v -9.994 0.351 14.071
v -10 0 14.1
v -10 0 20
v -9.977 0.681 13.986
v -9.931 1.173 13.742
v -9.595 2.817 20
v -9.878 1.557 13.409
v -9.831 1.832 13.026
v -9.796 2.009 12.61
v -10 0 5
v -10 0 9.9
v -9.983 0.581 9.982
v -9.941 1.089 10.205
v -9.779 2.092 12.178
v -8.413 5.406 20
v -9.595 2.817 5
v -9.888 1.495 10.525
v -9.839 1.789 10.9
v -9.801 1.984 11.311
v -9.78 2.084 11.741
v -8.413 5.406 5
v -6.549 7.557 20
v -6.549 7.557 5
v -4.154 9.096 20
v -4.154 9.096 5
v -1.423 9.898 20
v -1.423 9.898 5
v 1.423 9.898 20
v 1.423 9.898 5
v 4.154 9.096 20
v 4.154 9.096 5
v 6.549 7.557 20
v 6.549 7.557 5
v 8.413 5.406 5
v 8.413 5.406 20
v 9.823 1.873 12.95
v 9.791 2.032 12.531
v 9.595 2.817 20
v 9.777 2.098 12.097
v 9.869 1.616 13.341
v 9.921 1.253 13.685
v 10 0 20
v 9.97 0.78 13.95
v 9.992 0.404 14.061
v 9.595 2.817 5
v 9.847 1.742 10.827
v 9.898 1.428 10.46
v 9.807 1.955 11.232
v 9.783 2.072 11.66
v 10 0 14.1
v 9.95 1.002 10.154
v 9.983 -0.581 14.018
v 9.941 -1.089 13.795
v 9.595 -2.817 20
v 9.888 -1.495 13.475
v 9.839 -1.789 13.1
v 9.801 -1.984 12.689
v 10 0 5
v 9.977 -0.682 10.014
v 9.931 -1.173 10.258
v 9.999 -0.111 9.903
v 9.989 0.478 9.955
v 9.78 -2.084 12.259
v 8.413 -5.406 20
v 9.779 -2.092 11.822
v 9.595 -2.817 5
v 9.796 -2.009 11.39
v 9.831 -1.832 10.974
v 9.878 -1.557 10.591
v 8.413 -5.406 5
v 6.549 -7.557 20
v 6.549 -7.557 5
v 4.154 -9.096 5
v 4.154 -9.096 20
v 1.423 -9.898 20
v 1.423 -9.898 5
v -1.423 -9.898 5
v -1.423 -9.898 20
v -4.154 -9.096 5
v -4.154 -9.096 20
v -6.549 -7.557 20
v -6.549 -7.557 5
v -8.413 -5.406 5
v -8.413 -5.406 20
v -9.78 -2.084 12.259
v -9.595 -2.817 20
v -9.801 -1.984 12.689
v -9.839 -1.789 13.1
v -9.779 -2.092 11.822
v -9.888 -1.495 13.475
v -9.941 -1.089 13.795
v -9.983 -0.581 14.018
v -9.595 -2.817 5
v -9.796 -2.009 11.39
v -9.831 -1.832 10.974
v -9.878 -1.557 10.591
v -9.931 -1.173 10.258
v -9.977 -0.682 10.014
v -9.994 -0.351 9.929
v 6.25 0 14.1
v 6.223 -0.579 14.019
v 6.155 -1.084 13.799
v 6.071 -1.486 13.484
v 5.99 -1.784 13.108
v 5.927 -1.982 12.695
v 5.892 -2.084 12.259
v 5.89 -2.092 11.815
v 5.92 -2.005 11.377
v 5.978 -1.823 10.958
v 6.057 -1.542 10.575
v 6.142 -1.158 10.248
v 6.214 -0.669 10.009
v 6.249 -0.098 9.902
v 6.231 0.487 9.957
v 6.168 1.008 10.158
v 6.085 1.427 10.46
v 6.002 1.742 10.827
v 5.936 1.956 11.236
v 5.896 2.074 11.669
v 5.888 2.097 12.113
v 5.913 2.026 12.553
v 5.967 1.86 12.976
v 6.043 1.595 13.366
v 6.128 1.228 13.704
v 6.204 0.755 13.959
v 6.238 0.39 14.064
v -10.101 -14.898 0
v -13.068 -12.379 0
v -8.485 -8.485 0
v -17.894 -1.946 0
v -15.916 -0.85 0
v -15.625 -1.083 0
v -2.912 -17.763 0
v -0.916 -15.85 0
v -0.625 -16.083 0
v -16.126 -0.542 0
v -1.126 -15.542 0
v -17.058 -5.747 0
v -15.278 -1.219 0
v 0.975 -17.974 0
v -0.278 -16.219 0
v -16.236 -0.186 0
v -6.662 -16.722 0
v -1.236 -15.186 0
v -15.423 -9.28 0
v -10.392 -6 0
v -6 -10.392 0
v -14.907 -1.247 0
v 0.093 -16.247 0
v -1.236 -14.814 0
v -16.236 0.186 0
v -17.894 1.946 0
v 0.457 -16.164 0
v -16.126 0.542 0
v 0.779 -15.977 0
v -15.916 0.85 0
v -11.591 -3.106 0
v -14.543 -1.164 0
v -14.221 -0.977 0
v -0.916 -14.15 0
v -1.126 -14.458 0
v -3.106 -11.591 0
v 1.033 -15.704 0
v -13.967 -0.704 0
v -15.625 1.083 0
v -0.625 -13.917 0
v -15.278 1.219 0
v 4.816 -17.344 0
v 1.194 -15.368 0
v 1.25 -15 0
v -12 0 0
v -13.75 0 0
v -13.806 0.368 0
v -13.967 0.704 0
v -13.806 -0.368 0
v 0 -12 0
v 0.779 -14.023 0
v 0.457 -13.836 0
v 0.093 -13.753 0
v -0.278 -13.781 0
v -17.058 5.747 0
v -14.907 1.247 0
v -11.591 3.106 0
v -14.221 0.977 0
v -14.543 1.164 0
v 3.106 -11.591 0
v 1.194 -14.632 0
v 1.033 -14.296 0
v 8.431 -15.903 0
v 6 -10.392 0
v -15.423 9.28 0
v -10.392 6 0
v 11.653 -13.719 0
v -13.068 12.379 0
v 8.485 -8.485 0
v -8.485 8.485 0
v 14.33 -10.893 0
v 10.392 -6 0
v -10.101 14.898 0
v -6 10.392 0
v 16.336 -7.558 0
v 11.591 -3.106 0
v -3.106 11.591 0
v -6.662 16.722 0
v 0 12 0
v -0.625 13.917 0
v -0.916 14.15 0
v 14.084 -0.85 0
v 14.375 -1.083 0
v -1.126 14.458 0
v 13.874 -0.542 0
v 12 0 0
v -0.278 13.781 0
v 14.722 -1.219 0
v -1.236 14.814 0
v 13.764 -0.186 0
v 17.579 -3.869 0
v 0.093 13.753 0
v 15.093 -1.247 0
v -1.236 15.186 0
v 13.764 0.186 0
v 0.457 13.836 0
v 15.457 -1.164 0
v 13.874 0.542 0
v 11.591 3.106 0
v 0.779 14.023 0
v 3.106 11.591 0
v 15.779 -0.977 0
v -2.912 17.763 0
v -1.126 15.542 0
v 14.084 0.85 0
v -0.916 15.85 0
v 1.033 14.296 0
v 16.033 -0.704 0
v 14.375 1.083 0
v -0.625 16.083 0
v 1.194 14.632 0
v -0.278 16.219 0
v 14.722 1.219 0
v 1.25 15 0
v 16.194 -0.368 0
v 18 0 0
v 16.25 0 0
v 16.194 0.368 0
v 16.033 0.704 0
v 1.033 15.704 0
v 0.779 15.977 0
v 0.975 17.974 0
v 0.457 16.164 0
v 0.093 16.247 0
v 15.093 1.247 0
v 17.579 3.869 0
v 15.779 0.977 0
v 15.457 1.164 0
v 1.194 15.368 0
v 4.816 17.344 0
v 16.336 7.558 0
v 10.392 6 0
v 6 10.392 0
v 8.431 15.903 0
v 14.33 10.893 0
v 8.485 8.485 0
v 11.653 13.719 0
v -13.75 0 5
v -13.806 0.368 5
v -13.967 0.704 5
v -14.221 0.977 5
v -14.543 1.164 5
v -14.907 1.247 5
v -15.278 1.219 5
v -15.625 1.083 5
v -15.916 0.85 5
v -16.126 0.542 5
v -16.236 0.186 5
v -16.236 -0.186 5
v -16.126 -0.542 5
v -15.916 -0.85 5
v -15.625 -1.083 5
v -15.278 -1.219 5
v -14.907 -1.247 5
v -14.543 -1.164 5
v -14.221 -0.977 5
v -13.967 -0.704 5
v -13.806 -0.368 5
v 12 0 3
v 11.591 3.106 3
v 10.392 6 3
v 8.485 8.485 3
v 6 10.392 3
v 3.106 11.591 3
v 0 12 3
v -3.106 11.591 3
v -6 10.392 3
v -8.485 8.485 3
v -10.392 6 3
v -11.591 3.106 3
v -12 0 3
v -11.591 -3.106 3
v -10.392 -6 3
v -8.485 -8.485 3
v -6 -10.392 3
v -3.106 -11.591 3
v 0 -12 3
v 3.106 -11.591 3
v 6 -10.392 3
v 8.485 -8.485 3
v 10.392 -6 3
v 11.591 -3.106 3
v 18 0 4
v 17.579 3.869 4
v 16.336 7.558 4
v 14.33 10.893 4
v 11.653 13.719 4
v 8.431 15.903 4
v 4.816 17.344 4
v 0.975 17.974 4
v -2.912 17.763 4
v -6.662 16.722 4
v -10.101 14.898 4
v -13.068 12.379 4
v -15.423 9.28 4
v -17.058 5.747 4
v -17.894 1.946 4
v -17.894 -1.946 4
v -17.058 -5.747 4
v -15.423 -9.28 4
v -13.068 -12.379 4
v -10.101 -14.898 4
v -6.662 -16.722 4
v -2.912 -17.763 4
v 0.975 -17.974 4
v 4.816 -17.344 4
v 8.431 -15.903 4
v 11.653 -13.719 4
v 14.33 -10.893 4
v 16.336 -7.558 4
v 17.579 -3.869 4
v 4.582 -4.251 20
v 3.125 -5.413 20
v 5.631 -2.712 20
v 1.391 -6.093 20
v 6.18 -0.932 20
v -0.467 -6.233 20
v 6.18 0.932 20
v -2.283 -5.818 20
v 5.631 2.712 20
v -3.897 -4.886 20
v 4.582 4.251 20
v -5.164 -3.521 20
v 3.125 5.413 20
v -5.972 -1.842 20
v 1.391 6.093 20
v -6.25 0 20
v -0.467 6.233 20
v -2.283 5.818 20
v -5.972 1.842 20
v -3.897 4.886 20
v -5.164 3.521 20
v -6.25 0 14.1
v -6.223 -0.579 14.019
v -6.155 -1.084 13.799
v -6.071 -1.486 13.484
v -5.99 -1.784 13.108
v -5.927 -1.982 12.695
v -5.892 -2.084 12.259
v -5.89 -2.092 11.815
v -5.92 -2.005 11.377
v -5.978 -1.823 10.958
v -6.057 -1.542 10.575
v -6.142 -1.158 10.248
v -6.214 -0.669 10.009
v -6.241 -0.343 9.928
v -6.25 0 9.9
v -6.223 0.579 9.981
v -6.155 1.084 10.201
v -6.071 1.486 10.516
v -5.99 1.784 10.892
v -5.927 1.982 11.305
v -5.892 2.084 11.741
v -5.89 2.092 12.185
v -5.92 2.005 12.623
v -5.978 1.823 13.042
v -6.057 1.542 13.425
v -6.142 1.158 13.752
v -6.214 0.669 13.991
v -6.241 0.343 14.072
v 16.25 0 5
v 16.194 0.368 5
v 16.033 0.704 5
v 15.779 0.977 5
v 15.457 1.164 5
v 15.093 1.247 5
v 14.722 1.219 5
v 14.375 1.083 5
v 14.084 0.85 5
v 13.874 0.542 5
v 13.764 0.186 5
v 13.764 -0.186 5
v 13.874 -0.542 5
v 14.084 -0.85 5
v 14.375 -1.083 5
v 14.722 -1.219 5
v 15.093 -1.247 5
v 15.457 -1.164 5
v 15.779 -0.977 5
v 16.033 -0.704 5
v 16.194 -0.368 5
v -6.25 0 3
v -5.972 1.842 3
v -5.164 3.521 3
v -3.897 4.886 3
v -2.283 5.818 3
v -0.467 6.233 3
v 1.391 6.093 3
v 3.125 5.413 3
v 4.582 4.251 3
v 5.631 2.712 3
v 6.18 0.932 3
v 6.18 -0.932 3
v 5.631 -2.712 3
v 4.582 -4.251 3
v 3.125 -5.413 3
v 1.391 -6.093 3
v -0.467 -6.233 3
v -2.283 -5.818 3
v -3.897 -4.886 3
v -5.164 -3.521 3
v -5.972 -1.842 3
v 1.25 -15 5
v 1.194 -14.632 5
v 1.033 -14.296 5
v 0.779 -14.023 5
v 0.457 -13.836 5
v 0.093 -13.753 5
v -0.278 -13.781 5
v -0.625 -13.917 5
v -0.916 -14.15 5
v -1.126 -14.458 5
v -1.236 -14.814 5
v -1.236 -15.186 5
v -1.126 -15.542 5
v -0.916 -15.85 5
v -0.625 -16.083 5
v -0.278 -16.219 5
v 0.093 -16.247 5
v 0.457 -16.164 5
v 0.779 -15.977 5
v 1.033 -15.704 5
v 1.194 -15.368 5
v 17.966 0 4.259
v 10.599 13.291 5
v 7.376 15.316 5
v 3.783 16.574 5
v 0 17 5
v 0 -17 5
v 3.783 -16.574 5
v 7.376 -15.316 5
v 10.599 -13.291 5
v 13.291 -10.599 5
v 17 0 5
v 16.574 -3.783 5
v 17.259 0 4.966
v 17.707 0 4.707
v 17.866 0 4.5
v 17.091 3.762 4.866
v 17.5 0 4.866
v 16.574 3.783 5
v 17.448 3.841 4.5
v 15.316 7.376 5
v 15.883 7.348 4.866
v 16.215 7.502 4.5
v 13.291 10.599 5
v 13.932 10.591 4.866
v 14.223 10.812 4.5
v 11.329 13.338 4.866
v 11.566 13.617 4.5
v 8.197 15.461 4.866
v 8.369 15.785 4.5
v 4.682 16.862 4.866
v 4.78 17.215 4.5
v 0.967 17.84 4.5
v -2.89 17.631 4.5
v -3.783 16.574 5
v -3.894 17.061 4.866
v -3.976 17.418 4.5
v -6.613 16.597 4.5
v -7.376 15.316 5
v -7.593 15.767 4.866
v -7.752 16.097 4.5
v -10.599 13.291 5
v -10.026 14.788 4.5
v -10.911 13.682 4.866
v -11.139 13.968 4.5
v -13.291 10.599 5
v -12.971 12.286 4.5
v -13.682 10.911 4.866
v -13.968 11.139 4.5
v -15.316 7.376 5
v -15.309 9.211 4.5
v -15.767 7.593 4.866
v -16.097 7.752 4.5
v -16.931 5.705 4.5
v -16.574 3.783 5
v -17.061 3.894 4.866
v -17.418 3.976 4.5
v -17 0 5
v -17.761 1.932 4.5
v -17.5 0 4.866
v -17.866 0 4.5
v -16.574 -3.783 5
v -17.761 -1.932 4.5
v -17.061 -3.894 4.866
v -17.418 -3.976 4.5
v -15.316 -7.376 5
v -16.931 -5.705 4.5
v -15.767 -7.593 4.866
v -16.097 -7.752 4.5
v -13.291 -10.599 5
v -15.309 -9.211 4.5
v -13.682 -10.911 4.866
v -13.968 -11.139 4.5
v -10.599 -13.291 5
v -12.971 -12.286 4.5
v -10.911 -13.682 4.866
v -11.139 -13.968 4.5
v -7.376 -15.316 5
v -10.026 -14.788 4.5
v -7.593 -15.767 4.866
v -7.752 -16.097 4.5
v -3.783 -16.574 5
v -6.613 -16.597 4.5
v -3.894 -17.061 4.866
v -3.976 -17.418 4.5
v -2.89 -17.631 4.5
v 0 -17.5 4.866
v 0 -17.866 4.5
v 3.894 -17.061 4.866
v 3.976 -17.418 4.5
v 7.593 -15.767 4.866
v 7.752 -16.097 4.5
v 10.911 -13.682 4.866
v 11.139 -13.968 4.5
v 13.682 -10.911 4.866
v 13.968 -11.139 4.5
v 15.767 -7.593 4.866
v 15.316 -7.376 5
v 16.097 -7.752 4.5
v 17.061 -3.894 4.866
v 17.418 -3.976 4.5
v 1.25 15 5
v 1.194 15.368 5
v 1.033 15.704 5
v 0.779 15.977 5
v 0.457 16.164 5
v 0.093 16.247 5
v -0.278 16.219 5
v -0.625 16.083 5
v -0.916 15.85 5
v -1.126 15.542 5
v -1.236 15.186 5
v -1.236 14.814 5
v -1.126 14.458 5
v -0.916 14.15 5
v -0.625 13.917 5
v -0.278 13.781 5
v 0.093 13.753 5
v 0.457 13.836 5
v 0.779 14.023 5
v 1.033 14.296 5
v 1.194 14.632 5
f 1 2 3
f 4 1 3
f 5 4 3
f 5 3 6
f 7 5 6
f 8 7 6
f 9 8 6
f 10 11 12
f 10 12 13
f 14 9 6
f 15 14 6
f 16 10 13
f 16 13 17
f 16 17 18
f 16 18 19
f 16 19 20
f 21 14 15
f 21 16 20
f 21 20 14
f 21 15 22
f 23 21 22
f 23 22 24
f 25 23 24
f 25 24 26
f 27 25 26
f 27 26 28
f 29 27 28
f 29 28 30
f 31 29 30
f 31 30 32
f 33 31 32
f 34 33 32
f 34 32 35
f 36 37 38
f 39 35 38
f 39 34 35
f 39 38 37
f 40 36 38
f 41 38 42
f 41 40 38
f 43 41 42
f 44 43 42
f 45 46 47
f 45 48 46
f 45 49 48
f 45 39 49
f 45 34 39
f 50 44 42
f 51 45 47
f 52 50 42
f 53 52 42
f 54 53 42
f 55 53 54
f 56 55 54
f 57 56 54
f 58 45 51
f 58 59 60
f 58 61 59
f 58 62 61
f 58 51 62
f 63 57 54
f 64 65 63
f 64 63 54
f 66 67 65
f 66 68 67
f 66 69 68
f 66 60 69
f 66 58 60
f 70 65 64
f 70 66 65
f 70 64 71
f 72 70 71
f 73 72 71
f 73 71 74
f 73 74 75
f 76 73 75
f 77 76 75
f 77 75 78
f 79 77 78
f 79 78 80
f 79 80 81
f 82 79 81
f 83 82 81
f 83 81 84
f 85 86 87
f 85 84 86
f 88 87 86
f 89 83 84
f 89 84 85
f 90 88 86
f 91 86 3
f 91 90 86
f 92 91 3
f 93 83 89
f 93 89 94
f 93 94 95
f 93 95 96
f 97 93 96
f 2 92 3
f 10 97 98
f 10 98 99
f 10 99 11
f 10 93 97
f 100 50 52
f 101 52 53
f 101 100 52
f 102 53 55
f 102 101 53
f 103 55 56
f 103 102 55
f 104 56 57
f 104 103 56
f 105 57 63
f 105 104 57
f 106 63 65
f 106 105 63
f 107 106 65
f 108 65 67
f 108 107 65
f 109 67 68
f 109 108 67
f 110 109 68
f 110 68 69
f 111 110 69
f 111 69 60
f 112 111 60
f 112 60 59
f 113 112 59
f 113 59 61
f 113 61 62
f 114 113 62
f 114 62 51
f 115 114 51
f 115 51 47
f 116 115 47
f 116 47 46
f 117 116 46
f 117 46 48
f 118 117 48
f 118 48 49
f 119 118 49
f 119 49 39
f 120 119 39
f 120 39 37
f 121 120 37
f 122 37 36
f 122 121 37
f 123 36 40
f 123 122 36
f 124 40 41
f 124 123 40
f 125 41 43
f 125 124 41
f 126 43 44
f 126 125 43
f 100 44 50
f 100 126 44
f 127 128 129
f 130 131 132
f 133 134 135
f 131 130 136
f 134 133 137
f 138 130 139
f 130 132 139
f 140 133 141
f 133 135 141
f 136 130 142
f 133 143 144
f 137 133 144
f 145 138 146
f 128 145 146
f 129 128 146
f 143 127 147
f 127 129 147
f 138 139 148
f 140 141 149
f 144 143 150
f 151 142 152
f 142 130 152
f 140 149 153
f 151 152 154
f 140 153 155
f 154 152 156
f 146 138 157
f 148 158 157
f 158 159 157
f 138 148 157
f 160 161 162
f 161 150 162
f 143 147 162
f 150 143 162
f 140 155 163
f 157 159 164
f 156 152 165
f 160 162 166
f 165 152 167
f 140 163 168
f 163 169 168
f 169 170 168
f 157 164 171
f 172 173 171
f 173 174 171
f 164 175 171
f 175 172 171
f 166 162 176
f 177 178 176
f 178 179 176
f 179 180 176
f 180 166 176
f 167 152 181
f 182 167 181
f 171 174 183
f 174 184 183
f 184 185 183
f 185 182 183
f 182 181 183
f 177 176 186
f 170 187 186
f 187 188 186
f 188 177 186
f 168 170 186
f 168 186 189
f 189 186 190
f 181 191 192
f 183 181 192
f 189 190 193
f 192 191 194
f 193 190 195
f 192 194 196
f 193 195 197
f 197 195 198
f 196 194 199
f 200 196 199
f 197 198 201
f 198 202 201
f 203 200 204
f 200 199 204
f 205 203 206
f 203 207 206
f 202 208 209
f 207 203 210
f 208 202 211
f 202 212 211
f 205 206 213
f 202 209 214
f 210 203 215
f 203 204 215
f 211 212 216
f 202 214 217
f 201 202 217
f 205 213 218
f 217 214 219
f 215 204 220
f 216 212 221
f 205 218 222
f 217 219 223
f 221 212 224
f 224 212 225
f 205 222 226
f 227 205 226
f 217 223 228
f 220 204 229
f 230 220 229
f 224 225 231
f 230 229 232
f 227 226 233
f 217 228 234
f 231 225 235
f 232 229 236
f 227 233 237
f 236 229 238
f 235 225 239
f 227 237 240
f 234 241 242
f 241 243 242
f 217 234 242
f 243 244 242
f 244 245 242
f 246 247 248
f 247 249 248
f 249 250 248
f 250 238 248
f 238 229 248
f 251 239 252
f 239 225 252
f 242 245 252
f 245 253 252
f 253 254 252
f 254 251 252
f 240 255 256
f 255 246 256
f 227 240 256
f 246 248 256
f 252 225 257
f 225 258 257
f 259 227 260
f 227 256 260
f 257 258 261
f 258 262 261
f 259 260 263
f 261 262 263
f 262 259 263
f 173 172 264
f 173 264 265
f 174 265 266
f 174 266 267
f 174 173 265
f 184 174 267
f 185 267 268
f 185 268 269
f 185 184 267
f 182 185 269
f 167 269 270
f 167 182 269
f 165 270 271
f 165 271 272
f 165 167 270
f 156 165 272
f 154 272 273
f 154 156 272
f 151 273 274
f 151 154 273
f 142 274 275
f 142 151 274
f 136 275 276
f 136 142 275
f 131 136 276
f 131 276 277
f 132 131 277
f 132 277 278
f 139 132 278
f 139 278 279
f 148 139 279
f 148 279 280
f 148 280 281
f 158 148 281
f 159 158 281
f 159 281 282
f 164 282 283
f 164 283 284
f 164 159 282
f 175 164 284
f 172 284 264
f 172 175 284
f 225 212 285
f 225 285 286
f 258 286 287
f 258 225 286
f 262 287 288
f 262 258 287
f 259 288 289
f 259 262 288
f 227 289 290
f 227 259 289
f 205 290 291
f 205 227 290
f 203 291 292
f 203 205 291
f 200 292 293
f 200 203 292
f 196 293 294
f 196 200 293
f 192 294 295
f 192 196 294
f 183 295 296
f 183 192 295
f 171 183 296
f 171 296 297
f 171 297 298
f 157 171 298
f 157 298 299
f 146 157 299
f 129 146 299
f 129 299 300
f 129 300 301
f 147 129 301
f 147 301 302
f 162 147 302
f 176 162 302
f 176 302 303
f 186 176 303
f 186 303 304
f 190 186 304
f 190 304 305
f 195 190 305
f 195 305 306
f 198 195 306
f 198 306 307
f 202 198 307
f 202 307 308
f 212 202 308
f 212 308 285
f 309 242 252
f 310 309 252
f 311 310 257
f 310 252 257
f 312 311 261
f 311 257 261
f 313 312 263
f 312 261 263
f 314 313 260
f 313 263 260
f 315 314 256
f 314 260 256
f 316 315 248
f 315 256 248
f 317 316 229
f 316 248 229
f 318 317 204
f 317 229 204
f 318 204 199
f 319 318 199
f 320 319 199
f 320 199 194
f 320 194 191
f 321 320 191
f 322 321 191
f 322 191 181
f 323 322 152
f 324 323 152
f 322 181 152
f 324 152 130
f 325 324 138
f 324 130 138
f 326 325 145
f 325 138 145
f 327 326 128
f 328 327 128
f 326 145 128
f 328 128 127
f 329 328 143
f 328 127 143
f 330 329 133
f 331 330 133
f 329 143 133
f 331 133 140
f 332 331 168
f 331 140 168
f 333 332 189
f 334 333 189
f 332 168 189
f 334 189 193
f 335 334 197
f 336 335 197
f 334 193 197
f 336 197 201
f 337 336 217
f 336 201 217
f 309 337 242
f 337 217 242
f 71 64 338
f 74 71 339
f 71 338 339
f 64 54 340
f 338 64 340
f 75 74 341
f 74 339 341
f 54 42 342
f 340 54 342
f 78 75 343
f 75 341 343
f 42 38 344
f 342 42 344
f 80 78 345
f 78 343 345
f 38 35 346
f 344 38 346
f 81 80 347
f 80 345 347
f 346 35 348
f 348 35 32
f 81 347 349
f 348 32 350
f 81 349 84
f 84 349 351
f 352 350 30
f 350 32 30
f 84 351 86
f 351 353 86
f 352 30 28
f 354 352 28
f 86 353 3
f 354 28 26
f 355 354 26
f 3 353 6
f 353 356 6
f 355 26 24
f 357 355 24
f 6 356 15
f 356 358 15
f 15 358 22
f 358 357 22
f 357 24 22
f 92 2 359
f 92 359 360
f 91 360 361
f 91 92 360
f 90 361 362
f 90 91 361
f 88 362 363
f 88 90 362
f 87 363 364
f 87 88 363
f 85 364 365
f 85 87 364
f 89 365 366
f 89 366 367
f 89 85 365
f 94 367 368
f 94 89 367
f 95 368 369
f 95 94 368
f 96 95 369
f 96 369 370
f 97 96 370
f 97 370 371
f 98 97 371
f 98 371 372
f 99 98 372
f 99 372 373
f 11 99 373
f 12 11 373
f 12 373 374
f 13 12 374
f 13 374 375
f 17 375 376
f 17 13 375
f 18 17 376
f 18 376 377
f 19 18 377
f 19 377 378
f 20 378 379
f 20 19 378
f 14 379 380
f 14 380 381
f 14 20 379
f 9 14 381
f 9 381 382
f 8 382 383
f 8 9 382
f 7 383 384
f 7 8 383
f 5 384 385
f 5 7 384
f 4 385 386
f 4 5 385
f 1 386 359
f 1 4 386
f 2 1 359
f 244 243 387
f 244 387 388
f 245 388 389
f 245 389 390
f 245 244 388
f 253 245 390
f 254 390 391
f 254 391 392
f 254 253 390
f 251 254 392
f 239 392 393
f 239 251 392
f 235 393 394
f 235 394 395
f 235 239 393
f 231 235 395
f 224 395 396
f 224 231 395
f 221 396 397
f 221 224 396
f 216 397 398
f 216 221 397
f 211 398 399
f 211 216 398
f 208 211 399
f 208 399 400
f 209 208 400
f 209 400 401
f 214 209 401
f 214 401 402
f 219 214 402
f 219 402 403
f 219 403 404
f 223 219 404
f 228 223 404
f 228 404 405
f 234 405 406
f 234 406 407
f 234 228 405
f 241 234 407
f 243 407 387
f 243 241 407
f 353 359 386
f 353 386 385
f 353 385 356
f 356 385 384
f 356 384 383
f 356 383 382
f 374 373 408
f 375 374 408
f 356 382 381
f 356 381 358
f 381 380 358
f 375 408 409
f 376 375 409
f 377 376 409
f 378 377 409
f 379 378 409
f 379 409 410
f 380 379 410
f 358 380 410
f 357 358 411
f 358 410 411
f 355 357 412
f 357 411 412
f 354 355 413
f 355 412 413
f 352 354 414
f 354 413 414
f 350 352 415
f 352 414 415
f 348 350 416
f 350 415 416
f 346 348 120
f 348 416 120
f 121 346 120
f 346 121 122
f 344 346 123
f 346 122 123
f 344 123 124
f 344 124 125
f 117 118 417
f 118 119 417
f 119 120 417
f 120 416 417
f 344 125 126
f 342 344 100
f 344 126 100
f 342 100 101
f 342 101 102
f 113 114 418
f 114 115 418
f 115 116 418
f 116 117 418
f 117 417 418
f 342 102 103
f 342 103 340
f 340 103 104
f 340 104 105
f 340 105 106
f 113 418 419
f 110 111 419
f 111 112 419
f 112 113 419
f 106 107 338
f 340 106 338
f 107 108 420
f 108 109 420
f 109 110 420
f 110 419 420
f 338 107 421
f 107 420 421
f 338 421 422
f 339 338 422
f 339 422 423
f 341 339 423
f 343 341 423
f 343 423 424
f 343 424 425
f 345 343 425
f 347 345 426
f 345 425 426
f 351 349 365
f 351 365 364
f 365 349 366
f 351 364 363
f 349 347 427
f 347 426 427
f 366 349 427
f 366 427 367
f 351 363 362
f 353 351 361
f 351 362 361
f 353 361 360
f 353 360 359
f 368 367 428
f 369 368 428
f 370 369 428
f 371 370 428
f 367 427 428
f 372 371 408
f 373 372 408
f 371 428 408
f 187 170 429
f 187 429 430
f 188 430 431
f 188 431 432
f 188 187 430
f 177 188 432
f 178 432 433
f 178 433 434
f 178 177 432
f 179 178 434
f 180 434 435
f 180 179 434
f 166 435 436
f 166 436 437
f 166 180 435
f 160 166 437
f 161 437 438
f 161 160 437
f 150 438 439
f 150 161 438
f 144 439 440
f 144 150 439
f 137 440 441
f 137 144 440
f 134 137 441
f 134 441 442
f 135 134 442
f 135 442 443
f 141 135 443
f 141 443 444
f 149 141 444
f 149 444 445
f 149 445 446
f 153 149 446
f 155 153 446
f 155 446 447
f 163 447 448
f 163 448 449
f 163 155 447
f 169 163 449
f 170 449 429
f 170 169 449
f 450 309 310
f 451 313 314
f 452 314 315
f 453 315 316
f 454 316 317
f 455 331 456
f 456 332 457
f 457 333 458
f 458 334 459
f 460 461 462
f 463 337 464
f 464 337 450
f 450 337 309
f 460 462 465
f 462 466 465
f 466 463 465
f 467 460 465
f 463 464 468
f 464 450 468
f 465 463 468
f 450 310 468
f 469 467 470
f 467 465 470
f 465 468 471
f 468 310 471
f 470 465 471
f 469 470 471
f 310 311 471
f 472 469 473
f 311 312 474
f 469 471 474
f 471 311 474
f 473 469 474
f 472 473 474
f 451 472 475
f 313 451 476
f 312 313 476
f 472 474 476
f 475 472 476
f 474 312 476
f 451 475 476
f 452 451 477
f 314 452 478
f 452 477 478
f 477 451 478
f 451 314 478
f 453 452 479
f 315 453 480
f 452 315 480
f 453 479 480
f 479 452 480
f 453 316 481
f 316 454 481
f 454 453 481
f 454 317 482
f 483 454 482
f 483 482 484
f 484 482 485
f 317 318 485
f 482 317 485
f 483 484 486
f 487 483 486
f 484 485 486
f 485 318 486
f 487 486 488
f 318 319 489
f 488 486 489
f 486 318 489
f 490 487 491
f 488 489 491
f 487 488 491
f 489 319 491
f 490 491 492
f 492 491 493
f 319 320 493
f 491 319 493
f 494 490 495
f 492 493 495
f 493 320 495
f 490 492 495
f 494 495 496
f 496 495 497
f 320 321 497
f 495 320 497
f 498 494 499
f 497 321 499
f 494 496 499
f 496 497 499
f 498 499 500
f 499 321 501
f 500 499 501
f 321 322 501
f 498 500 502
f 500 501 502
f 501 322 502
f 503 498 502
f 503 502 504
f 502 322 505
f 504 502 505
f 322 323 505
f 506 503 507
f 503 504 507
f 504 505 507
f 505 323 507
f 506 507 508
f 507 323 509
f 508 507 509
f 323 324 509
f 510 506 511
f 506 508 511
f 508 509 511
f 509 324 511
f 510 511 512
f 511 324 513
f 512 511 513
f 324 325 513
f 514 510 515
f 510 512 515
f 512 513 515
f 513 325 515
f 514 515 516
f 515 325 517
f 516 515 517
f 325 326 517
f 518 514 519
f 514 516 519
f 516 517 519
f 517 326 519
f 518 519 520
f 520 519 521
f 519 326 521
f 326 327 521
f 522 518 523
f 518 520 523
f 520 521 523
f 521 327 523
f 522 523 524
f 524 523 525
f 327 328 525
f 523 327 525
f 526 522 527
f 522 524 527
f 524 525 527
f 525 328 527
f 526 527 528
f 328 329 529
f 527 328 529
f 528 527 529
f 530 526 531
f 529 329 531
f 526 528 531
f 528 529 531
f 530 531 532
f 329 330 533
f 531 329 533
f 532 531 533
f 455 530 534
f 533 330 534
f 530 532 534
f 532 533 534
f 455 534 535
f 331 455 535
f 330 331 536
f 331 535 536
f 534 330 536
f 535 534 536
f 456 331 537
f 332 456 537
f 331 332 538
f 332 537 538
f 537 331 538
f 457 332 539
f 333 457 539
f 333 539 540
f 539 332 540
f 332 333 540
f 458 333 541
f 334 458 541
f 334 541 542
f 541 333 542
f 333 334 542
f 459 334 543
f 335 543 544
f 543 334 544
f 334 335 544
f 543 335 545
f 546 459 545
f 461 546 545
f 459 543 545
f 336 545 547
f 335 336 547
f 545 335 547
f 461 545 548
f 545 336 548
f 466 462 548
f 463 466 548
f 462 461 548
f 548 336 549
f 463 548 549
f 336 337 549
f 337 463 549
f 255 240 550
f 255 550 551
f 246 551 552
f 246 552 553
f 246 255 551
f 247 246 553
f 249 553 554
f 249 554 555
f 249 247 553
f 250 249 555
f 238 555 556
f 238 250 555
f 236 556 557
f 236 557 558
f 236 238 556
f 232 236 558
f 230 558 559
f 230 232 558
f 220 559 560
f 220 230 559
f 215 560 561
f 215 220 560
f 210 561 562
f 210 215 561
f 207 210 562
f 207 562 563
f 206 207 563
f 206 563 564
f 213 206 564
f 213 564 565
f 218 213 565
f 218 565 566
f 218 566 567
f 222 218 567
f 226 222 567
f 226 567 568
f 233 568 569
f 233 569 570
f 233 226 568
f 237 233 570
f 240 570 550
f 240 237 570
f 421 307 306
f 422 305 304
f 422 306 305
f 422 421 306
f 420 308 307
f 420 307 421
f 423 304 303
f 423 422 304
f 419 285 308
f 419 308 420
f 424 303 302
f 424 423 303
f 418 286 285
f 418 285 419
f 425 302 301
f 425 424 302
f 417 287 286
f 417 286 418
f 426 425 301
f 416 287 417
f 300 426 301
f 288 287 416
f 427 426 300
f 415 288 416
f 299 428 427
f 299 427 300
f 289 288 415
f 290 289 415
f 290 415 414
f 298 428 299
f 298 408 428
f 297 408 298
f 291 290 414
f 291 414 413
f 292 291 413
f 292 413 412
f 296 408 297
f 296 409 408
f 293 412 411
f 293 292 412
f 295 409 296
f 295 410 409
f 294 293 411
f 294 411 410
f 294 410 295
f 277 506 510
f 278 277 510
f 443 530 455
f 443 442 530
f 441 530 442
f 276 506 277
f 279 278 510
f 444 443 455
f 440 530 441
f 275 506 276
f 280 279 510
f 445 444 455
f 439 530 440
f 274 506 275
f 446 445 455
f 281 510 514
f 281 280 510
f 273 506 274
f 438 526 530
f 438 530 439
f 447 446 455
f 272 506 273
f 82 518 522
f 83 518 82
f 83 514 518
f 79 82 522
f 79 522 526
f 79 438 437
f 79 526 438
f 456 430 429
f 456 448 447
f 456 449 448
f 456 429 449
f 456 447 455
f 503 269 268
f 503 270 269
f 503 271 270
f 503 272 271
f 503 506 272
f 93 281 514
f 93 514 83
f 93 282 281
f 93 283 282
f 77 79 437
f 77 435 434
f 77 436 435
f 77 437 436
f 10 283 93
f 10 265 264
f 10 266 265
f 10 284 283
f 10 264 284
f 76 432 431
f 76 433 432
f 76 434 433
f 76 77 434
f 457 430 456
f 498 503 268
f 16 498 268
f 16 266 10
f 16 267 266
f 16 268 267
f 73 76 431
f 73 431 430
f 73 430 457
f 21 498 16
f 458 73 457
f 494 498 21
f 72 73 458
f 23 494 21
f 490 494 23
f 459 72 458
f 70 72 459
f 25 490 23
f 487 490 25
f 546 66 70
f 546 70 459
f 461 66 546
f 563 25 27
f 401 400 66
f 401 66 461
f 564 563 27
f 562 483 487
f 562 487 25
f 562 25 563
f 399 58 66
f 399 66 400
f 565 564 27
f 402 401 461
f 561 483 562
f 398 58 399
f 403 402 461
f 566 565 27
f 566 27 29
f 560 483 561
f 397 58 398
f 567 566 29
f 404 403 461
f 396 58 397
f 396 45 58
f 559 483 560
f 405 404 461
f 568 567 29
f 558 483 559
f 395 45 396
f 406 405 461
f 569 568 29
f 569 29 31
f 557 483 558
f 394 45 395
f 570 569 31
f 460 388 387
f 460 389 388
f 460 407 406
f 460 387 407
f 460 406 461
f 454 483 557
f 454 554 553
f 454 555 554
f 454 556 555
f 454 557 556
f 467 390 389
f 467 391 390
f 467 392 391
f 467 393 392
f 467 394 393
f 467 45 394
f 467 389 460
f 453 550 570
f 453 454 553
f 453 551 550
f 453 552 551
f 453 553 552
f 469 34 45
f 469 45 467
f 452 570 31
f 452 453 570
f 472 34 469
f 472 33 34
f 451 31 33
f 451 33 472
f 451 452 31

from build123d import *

# Parameters (mm, degrees)
SKETCH_1_R               = 18
SKETCH_1_R_2             = 12
SKETCH_1_R_3             = 1.25
EXTRUDE_1_DEPTH          = 5
EXTRUDE_START            = -2
SKETCH_2_R               = 12
SKETCH_2_R_2             = 10
EXTRUDE_2_DEPTH          = 2
FILLET_1_R               = 1
SKETCH_3_R               = 10
SKETCH_3_R_2             = 6.25
EXTRUDE_3_DEPTH          = 17
CUT_EXTRUDE_1_DEPTH      = 20
CUT_EXTRUDE_1_DEPTH_BACK = 20
SKETCH_4_R               = 2.1


with BuildPart() as part:
    # 草图1 → 凸台-拉伸1 (new body)
    with BuildSketch(Plane.XY):
        Circle(SKETCH_1_R)
        Circle(SKETCH_1_R_2, mode=Mode.SUBTRACT)
        with Locations((0, 15)):
            Circle(SKETCH_1_R_3, mode=Mode.SUBTRACT)
        with Locations((-15, 0)):
            Circle(SKETCH_1_R_3, mode=Mode.SUBTRACT)
        with Locations((0, -15)):
            Circle(SKETCH_1_R_3, mode=Mode.SUBTRACT)
        with Locations((15, 0)):
            Circle(SKETCH_1_R_3, mode=Mode.SUBTRACT)
    extrude(amount=EXTRUDE_1_DEPTH)

    # 草图2 → 凸台-拉伸2 (add)
    with BuildSketch(Plane.XY.offset(5).offset(EXTRUDE_START)):
        Circle(SKETCH_2_R)
        Circle(SKETCH_2_R_2, mode=Mode.SUBTRACT)
    extrude(amount=EXTRUDE_2_DEPTH)

    # 圆角1
    fillet_1_edges = [part.edges().sort_by_distance(p)[0] for p in [
        (-18, 0, 5),
    ]]
    fillet(fillet_1_edges, radius=FILLET_1_R)

    # 草图3 → 凸台-拉伸3 (add)
    with BuildSketch(Plane(origin=(0, 0, 3), x_dir=(-1, 0, 0), z_dir=(0, 0, -1))):
        Circle(SKETCH_3_R)
        Circle(SKETCH_3_R_2, mode=Mode.SUBTRACT)
    extrude(amount=-EXTRUDE_3_DEPTH)

    # 草图4 → 切除-拉伸1 (cut, two sides: drawn at the far end of the back side and taken through both)
    with BuildSketch(Plane(origin=(0, 0, 0), x_dir=(0, 0, -1), z_dir=(1, 0, 0)).offset(-CUT_EXTRUDE_1_DEPTH_BACK)):
        with Locations((-12, 0)):
            Circle(SKETCH_4_R)
    extrude(amount=CUT_EXTRUDE_1_DEPTH + CUT_EXTRUDE_1_DEPTH_BACK, mode=Mode.SUBTRACT)


solid = part.part
